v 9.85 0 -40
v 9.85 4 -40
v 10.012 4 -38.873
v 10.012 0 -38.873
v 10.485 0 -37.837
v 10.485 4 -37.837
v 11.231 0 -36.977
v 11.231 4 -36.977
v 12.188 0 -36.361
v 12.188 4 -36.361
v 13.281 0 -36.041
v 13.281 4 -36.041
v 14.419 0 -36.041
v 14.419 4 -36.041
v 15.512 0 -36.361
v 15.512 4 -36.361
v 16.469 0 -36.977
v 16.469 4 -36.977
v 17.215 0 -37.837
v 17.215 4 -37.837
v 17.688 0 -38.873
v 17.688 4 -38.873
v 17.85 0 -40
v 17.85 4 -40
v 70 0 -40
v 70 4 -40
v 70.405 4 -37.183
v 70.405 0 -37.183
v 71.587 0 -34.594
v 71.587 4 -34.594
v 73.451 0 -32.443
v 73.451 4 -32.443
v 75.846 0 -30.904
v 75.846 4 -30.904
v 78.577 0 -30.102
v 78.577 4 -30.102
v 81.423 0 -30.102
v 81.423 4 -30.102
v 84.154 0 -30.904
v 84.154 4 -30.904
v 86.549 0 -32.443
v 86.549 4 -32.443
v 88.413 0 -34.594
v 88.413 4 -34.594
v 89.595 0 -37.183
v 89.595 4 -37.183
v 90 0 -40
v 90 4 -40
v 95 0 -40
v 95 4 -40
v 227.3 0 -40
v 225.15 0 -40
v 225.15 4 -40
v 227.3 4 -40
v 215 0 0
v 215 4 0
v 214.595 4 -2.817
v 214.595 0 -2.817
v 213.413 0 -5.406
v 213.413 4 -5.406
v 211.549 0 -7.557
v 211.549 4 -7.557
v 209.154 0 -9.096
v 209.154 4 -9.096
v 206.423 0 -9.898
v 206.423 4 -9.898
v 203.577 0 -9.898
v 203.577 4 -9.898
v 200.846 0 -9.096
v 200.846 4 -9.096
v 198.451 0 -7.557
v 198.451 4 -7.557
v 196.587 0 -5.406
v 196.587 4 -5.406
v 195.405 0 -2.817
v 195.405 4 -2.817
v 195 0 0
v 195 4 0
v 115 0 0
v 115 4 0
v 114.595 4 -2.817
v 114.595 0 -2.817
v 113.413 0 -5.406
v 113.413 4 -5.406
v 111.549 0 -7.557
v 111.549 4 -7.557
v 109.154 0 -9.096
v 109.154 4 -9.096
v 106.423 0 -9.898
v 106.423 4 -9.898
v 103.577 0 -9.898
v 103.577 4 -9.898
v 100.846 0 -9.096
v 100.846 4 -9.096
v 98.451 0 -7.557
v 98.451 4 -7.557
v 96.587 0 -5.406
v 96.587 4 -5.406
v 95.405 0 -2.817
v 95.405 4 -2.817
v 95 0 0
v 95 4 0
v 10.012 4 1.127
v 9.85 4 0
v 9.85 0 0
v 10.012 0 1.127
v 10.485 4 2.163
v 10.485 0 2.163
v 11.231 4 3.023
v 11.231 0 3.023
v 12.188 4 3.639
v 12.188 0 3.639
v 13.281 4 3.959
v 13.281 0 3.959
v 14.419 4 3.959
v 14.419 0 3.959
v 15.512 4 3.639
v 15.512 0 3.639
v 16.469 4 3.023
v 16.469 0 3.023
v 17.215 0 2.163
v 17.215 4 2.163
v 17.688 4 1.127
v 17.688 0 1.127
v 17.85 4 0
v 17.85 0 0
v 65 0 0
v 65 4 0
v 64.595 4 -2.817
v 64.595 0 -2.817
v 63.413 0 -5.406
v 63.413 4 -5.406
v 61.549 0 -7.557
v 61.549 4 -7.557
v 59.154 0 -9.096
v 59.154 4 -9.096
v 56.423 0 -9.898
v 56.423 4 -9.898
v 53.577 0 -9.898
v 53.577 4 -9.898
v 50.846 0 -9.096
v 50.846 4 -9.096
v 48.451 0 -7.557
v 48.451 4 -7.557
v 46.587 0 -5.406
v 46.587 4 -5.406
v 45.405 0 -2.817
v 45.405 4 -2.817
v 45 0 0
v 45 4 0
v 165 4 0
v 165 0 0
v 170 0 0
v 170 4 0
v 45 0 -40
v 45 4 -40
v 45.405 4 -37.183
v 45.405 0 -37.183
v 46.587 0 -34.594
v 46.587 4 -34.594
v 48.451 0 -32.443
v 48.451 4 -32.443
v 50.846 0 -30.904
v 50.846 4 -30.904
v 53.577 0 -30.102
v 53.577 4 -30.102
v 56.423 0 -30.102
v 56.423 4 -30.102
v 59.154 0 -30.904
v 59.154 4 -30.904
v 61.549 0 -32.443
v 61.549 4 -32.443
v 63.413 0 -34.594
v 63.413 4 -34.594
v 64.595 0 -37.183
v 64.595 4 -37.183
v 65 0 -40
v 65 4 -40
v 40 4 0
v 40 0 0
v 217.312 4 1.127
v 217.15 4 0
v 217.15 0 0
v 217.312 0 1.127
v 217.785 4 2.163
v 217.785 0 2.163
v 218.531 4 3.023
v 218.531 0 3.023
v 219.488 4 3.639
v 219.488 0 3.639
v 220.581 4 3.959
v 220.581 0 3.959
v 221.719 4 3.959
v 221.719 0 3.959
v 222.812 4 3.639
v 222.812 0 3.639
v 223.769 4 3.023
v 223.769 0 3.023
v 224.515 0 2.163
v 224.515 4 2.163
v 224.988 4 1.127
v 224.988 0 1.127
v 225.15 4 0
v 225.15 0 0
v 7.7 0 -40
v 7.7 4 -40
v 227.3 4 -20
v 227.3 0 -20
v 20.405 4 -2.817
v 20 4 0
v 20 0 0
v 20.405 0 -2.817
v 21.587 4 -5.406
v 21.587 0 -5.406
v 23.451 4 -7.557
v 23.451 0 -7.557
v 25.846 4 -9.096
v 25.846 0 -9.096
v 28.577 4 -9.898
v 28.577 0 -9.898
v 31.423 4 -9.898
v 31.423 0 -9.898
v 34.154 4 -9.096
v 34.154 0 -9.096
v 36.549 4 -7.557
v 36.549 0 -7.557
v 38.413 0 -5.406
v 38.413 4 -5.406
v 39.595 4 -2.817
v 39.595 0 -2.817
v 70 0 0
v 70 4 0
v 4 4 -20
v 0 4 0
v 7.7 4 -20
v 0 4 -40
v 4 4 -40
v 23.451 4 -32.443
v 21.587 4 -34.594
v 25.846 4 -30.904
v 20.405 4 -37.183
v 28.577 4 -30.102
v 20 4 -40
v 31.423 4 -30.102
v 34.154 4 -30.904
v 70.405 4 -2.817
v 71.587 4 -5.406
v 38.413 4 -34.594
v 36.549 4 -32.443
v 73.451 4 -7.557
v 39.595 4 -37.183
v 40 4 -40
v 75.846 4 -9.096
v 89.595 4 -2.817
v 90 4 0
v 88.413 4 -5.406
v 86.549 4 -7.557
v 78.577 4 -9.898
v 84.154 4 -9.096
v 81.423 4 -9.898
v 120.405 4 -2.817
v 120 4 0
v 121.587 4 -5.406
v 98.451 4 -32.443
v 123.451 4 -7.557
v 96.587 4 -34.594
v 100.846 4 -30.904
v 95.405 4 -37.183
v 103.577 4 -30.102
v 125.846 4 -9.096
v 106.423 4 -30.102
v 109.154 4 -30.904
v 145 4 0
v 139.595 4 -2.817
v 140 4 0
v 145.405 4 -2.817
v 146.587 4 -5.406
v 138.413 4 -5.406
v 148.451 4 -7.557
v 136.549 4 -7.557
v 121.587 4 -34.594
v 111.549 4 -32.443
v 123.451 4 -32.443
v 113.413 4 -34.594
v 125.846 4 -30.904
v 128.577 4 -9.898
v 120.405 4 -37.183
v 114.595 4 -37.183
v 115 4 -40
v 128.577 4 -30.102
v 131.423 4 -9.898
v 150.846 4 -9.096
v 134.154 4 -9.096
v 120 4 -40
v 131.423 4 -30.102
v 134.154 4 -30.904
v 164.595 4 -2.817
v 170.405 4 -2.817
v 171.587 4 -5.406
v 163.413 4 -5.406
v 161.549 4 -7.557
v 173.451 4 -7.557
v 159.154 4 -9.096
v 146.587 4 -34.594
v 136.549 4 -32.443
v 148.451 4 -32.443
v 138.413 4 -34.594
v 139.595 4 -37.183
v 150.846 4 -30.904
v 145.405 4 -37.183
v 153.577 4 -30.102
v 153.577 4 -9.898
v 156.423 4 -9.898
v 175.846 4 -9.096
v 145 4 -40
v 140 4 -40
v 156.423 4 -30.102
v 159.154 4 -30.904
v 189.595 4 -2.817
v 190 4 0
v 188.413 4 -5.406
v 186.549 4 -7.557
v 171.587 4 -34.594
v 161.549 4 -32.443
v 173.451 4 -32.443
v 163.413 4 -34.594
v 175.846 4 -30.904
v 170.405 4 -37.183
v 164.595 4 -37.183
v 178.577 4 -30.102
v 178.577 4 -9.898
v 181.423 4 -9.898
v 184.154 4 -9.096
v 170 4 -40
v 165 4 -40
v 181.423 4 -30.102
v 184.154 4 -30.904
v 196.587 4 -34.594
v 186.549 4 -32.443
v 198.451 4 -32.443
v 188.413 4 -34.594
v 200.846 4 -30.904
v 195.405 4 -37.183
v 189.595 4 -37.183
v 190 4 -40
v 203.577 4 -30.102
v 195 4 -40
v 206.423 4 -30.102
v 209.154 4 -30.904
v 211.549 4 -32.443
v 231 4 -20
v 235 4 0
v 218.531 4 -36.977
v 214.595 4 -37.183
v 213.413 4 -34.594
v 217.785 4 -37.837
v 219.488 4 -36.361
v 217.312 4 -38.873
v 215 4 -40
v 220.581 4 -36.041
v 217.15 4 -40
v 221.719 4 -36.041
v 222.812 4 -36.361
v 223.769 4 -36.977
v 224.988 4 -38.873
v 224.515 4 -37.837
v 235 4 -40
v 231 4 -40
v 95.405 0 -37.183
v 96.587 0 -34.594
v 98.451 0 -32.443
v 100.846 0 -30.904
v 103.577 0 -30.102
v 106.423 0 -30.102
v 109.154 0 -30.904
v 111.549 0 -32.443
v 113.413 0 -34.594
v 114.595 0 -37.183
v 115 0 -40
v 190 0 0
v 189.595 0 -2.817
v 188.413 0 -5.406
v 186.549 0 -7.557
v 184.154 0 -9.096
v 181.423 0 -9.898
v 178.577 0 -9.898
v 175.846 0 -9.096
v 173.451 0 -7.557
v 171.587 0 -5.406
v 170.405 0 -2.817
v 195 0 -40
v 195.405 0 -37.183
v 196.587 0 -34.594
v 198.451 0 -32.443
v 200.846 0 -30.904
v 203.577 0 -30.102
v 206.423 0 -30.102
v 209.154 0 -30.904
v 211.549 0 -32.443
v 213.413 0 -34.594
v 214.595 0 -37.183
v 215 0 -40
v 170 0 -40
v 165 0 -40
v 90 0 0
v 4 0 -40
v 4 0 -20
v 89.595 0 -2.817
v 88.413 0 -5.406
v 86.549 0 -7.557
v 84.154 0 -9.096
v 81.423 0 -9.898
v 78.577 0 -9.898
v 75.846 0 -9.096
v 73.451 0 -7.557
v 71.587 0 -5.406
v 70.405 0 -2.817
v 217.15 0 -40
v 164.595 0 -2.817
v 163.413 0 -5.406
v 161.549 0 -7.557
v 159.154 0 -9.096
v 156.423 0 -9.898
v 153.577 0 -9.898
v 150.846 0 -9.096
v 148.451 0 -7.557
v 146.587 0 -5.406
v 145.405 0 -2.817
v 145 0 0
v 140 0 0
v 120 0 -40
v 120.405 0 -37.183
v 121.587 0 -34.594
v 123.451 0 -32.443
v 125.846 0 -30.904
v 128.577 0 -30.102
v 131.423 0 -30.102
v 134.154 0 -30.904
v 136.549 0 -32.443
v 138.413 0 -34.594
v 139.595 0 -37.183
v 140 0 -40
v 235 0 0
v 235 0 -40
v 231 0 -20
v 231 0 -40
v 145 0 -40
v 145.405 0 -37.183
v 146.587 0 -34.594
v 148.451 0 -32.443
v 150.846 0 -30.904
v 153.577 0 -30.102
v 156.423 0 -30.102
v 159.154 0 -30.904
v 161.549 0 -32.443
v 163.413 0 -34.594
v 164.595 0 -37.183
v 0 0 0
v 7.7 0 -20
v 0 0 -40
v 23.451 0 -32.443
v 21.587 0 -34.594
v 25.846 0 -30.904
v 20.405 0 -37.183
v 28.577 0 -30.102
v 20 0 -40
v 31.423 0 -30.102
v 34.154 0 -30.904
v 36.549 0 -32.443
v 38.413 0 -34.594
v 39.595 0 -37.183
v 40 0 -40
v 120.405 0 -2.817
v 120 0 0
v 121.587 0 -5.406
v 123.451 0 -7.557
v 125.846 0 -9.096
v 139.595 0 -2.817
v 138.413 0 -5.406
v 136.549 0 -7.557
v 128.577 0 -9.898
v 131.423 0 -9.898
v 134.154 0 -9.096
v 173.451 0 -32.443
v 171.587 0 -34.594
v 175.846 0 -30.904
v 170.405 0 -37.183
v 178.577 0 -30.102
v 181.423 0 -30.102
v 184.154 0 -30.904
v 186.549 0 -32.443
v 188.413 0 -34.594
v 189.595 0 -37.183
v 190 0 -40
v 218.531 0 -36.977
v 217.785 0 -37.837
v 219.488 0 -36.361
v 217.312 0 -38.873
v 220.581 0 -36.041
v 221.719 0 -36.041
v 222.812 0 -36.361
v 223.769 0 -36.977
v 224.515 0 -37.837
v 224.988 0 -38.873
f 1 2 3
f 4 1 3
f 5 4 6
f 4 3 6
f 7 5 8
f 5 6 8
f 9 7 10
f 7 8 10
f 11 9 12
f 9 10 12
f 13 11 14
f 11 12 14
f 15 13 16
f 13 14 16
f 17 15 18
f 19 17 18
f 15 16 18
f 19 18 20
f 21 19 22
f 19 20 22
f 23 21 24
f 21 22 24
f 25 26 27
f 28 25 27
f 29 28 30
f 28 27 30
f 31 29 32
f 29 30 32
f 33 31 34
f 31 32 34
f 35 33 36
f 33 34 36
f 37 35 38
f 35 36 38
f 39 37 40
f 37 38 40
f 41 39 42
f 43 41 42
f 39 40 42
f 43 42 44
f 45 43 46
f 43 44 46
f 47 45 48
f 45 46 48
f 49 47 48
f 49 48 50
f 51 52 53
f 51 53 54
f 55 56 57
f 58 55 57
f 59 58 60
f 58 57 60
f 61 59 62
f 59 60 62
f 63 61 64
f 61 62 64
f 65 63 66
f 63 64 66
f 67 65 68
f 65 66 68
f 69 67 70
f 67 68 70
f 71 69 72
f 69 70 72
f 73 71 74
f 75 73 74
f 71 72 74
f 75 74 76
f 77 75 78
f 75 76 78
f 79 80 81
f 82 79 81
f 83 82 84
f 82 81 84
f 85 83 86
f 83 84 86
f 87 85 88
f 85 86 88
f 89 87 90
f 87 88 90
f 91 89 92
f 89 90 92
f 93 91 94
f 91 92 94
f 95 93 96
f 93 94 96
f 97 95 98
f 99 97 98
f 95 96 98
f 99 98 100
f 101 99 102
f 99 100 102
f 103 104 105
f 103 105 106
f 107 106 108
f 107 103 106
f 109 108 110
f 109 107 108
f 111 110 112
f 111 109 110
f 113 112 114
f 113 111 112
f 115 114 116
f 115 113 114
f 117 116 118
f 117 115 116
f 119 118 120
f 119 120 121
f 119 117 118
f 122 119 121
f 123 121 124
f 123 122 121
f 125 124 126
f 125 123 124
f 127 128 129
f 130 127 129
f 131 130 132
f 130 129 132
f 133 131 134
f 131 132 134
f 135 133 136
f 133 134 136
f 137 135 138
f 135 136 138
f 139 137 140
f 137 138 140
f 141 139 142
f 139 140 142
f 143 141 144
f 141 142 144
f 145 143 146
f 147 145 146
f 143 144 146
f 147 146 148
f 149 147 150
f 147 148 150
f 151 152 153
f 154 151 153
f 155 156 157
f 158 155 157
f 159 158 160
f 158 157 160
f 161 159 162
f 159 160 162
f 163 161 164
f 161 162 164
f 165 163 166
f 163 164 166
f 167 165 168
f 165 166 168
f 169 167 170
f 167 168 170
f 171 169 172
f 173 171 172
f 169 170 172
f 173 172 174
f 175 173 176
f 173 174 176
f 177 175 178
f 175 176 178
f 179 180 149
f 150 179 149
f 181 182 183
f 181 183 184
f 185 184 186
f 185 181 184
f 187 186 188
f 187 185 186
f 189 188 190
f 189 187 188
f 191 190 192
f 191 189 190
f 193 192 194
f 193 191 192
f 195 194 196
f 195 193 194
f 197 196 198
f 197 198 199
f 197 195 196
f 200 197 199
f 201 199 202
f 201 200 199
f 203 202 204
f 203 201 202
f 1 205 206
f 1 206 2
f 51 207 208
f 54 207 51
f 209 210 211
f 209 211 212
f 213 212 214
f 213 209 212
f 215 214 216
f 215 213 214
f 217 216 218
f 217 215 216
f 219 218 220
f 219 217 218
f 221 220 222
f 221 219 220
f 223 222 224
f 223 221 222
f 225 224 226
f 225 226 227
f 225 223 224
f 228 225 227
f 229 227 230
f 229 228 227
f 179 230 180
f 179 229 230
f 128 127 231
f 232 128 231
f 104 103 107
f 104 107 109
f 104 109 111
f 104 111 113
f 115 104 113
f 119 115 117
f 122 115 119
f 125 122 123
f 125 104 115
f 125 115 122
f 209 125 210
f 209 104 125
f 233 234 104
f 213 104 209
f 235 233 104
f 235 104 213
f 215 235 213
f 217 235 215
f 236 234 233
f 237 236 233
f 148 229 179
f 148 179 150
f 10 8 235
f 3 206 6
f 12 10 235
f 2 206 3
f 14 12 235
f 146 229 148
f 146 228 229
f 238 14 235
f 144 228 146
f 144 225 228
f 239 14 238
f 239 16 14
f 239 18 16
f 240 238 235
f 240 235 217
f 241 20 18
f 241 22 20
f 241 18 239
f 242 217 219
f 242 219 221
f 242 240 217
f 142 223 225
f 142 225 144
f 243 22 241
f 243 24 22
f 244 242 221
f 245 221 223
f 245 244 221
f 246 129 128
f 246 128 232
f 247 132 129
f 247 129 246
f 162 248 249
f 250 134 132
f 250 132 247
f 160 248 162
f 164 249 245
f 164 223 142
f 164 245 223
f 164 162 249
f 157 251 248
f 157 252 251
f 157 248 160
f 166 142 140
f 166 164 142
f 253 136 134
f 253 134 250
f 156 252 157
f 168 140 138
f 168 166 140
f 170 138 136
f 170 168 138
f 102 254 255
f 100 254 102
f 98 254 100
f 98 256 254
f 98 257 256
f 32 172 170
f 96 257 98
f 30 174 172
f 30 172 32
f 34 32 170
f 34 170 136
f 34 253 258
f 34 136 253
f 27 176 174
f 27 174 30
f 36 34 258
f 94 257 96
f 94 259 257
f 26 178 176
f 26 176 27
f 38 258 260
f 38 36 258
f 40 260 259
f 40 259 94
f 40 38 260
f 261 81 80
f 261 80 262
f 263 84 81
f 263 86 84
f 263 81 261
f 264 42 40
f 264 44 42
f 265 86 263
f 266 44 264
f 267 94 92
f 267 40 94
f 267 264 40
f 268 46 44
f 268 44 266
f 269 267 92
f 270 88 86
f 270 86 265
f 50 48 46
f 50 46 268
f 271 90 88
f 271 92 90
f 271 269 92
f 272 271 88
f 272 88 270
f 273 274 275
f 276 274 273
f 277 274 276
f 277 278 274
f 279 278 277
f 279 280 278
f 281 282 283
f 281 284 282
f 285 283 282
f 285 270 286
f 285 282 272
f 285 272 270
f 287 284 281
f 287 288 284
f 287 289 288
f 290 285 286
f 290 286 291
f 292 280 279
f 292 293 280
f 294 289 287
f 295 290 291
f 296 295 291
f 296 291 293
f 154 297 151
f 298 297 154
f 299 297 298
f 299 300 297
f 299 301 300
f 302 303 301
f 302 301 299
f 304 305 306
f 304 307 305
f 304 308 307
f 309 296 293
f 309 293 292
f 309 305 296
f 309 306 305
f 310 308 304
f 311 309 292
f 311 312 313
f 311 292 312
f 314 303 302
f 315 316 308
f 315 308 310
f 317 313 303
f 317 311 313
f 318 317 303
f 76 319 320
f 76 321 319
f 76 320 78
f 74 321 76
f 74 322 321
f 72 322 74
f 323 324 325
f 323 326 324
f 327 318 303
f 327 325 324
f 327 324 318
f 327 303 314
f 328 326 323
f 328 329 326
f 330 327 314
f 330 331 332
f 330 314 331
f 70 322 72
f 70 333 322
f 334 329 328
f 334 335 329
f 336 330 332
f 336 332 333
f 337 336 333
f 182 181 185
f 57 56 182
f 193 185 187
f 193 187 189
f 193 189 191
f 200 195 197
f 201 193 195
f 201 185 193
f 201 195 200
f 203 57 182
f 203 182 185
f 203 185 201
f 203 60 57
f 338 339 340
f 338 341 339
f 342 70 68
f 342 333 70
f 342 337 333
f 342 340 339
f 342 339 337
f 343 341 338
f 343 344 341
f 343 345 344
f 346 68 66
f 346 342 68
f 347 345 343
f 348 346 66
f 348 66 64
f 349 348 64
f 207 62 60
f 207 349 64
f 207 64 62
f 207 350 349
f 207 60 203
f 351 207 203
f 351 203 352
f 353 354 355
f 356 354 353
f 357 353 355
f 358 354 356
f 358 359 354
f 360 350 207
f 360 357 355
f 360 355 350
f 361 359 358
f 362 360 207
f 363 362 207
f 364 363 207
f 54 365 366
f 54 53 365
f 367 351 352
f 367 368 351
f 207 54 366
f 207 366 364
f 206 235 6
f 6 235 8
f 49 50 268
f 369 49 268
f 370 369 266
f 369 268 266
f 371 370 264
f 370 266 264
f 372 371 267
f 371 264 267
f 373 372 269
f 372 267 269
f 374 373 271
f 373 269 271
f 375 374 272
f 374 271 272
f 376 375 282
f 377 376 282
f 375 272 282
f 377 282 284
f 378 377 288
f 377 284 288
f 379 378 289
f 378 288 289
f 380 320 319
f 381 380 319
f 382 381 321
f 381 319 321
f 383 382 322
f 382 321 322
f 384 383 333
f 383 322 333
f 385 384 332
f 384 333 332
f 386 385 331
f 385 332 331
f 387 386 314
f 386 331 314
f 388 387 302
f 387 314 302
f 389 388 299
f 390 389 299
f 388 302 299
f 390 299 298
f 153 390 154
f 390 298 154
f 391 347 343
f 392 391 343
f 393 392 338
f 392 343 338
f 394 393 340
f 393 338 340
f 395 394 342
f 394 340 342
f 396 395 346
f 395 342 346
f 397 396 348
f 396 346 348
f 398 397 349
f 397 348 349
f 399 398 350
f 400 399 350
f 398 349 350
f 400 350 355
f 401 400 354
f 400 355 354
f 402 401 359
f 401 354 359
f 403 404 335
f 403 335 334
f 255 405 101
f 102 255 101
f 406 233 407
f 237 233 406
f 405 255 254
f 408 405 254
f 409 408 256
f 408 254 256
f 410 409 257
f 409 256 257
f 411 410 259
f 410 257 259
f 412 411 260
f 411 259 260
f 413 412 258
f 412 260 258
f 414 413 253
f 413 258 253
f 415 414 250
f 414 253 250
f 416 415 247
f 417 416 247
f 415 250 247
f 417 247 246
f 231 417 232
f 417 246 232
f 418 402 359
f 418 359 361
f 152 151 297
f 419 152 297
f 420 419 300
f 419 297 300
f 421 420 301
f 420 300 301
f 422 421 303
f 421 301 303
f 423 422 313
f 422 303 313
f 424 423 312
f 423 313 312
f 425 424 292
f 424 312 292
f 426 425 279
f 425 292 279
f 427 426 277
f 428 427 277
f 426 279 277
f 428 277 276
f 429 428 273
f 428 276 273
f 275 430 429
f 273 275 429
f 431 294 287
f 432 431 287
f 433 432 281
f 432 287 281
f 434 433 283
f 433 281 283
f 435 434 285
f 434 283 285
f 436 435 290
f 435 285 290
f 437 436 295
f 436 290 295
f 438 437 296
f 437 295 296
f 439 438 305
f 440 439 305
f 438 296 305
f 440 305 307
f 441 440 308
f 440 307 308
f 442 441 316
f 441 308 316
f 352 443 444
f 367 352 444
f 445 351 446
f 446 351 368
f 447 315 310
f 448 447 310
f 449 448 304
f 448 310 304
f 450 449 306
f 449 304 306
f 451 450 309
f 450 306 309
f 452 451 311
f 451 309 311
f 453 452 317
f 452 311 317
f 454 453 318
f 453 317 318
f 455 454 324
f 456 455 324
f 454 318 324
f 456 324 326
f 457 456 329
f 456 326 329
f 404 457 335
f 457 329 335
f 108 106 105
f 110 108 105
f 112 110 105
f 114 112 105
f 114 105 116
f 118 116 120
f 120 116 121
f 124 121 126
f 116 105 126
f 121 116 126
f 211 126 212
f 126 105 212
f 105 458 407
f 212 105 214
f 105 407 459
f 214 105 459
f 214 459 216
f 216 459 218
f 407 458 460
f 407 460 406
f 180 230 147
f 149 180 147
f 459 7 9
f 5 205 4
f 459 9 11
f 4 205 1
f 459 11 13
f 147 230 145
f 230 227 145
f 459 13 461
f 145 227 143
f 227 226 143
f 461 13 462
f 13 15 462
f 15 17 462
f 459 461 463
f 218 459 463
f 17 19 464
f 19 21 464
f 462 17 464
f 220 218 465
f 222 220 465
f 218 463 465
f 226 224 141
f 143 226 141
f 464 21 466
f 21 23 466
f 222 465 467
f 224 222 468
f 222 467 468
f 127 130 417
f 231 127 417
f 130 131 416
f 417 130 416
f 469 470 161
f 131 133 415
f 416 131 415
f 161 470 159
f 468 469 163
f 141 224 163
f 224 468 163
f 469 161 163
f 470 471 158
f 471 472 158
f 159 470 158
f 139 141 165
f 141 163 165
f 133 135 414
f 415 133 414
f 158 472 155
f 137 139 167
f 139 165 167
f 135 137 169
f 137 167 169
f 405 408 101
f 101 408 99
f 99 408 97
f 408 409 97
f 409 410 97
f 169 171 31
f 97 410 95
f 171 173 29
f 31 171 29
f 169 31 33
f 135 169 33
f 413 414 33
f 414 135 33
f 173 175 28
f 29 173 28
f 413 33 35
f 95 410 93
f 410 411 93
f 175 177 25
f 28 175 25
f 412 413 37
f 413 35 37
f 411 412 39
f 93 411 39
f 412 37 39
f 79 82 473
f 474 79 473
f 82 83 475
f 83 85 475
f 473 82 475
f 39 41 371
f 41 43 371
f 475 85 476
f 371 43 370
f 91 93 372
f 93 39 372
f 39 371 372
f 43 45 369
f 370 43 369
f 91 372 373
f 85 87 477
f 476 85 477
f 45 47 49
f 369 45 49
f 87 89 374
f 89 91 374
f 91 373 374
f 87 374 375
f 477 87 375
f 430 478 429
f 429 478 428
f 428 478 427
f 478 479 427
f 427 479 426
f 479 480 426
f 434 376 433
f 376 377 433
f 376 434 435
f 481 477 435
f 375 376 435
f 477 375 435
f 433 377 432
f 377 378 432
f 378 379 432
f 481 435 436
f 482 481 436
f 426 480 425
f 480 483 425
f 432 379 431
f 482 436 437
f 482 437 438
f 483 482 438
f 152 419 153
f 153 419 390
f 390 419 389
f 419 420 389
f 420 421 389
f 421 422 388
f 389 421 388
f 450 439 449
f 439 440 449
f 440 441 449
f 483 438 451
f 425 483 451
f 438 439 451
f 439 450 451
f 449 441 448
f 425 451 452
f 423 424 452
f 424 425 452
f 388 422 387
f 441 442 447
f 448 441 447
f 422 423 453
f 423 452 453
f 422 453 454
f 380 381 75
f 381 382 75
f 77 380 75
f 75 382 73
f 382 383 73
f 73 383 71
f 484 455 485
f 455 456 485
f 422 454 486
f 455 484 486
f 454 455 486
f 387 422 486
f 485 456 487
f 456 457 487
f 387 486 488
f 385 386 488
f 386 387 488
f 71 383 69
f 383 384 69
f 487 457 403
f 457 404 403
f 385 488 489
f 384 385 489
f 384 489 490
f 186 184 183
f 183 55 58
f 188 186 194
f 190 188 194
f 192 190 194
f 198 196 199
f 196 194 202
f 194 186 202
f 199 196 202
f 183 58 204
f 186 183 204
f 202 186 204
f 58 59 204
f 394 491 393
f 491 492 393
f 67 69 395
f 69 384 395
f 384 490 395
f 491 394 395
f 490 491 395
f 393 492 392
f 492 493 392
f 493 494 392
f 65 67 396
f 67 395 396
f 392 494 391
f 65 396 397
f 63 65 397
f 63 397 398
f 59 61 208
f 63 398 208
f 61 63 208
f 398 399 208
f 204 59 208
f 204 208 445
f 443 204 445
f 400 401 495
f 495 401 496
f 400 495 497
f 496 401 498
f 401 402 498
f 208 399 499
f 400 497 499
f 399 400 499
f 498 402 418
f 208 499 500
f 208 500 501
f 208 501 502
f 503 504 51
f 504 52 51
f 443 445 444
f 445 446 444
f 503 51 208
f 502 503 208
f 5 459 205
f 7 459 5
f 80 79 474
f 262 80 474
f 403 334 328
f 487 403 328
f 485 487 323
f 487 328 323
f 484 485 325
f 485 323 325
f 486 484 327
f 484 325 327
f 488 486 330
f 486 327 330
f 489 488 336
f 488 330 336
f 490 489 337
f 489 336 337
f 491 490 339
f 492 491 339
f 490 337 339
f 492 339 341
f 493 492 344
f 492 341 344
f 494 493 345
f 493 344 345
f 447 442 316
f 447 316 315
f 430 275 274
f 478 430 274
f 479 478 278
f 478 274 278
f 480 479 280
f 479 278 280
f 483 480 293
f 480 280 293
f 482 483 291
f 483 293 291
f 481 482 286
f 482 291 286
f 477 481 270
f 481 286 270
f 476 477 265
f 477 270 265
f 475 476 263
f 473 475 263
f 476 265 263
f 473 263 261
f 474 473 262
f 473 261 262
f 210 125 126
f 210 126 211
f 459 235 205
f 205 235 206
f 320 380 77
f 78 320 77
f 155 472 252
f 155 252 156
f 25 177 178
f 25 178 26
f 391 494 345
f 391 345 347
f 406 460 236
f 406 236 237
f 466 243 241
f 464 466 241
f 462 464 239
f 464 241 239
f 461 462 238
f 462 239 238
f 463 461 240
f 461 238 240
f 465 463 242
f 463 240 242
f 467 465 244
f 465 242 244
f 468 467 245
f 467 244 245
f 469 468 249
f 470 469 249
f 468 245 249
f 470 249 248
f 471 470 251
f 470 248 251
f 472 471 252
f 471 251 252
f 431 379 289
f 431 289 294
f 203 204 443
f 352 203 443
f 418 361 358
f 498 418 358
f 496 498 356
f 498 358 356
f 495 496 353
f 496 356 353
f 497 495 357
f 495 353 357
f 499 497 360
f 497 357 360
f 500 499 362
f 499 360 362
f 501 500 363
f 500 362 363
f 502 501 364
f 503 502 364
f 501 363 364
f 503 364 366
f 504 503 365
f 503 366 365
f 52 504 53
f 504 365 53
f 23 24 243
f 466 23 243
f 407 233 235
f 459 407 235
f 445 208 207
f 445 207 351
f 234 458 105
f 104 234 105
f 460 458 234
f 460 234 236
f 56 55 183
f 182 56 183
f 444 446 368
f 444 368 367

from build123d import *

# Parameters (mm, degrees)
SKETCH1_W               = 235
SKETCH1_H               = 40
BOSS_EXTRUDE1_DEPTH     = 4
SKETCH2_W               = 3.7
SKETCH2_H               = 20
CUT_EXTRUDE1_DEPTH      = 4
SKETCH3_R               = 10
CUT_EXTRUDE2_DEPTH      = 4
LPATTERN1_COUNT         = 8
LPATTERN1_PITCH         = 25
SKETCH4_R               = 4
CUT_EXTRUDE3_DEPTH      = 4
SKETCH5_R               = 4
BOSS_EXTRUDE2_DEPTH     = 4
MIRROR1_COPY_1_SKETCH_R = 10
MIRROR1_COPY_1_DEPTH    = 4
MIRROR1_COPY_2_SKETCH_R = 10
MIRROR1_COPY_2_DEPTH    = 4
MIRROR1_COPY_3_SKETCH_R = 10
MIRROR1_COPY_3_DEPTH    = 4
MIRROR1_COPY_4_SKETCH_R = 10
MIRROR1_COPY_4_DEPTH    = 4
MIRROR1_COPY_5_SKETCH_R = 10
MIRROR1_COPY_5_DEPTH    = 4
MIRROR1_COPY_6_SKETCH_R = 10
MIRROR1_COPY_6_DEPTH    = 4
MIRROR1_COPY_7_SKETCH_R = 10
MIRROR1_COPY_7_DEPTH    = 4


with BuildPart() as part:
    # Sketch1 → Boss-Extrude1 (new body)
    with BuildSketch(Plane(origin=(0, 0, 0), x_dir=(1, 0, 0), z_dir=(0, 1, 0))):
        with Locations((117.5, 20)):
            Rectangle(SKETCH1_W, SKETCH1_H)
    extrude(amount=BOSS_EXTRUDE1_DEPTH)

    # Sketch2 → Cut-Extrude1 (cut)
    with BuildSketch(Plane(origin=(0, 4, 0), x_dir=(1, 0, 0), z_dir=(0, 1, 0))):
        with Locations((5.85, 30)):
            Rectangle(SKETCH2_W, SKETCH2_H)
        with Locations((229.15, 30)):
            Rectangle(SKETCH2_W, SKETCH2_H)
    extrude(amount=-CUT_EXTRUDE1_DEPTH, mode=Mode.SUBTRACT)

    # Sketch3 → Cut-Extrude2 (cut)
    with BuildSketch(Plane(origin=(0, 4, 0), x_dir=(1, 0, 0), z_dir=(0, 1, 0))):
        with Locations((30, 40)):
            Circle(SKETCH3_R)
    cut_extrude2 = extrude(amount=-CUT_EXTRUDE2_DEPTH, mode=Mode.SUBTRACT)

    # LPattern1: Cut-Extrude2 ×8
    with Locations(*[(i * LPATTERN1_PITCH, 0, 0) for i in range(1, LPATTERN1_COUNT)]):
        add(cut_extrude2, mode=Mode.SUBTRACT)

    # Sketch4 → Cut-Extrude3 (cut)
    with BuildSketch(Plane(origin=(0, 4, 0), x_dir=(1, 0, 0), z_dir=(0, 1, 0))):
        with Locations((221.15, 40)):
            Circle(SKETCH4_R)
        with Locations((13.85, 40)):
            Circle(SKETCH4_R)
    extrude(amount=-CUT_EXTRUDE3_DEPTH, mode=Mode.SUBTRACT)

    # Sketch5 → Boss-Extrude2 (add)
    with BuildSketch(Plane(origin=(0, 4, 0), x_dir=(1, 0, 0), z_dir=(0, 1, 0))):
        with Locations((221.15, 0)):
            Circle(SKETCH5_R)
        with Locations((13.85, 0)):
            Circle(SKETCH5_R)
    extrude(amount=-BOSS_EXTRUDE2_DEPTH)

    # Mirror1: Cut-Extrude2 across plane
    add(cut_extrude2.mirror(Plane(origin=(0, 0, -20), x_dir=(1, 0, 0), z_dir=(0, 0, -1))), mode=Mode.SUBTRACT)

    # Mirror1 copy 1 sketch → Mirror1 copy 1 (cut)
    with BuildSketch(Plane(origin=(25, 4, -40), x_dir=(1, 0, 0), z_dir=(0, 1, 0))):
        with Locations((30, -40)):
            Circle(MIRROR1_COPY_1_SKETCH_R)
    extrude(amount=-MIRROR1_COPY_1_DEPTH, mode=Mode.SUBTRACT)

    # Mirror1 copy 2 sketch → Mirror1 copy 2 (cut)
    with BuildSketch(Plane(origin=(50, 4, -40), x_dir=(1, 0, 0), z_dir=(0, 1, 0))):
        with Locations((30, -40)):
            Circle(MIRROR1_COPY_2_SKETCH_R)
    extrude(amount=-MIRROR1_COPY_2_DEPTH, mode=Mode.SUBTRACT)

    # Mirror1 copy 3 sketch → Mirror1 copy 3 (cut)
    with BuildSketch(Plane(origin=(75, 4, -40), x_dir=(1, 0, 0), z_dir=(0, 1, 0))):
        with Locations((30, -40)):
            Circle(MIRROR1_COPY_3_SKETCH_R)
    extrude(amount=-MIRROR1_COPY_3_DEPTH, mode=Mode.SUBTRACT)

    # Mirror1 copy 4 sketch → Mirror1 copy 4 (cut)
    with BuildSketch(Plane(origin=(100, 4, -40), x_dir=(1, 0, 0), z_dir=(0, 1, 0))):
        with Locations((30, -40)):
            Circle(MIRROR1_COPY_4_SKETCH_R)
    extrude(amount=-MIRROR1_COPY_4_DEPTH, mode=Mode.SUBTRACT)

    # Mirror1 copy 5 sketch → Mirror1 copy 5 (cut)
    with BuildSketch(Plane(origin=(125, 4, -40), x_dir=(1, 0, 0), z_dir=(0, 1, 0))):
        with Locations((30, -40)):
            Circle(MIRROR1_COPY_5_SKETCH_R)
    extrude(amount=-MIRROR1_COPY_5_DEPTH, mode=Mode.SUBTRACT)

    # Mirror1 copy 6 sketch → Mirror1 copy 6 (cut)
    with BuildSketch(Plane(origin=(150, 4, -40), x_dir=(1, 0, 0), z_dir=(0, 1, 0))):
        with Locations((30, -40)):
            Circle(MIRROR1_COPY_6_SKETCH_R)
    extrude(amount=-MIRROR1_COPY_6_DEPTH, mode=Mode.SUBTRACT)

    # Mirror1 copy 7 sketch → Mirror1 copy 7 (cut)
    with BuildSketch(Plane(origin=(175, 4, -40), x_dir=(1, 0, 0), z_dir=(0, 1, 0))):
        with Locations((30, -40)):
            Circle(MIRROR1_COPY_7_SKETCH_R)
    extrude(amount=-MIRROR1_COPY_7_DEPTH, mode=Mode.SUBTRACT)


solid = part.part
